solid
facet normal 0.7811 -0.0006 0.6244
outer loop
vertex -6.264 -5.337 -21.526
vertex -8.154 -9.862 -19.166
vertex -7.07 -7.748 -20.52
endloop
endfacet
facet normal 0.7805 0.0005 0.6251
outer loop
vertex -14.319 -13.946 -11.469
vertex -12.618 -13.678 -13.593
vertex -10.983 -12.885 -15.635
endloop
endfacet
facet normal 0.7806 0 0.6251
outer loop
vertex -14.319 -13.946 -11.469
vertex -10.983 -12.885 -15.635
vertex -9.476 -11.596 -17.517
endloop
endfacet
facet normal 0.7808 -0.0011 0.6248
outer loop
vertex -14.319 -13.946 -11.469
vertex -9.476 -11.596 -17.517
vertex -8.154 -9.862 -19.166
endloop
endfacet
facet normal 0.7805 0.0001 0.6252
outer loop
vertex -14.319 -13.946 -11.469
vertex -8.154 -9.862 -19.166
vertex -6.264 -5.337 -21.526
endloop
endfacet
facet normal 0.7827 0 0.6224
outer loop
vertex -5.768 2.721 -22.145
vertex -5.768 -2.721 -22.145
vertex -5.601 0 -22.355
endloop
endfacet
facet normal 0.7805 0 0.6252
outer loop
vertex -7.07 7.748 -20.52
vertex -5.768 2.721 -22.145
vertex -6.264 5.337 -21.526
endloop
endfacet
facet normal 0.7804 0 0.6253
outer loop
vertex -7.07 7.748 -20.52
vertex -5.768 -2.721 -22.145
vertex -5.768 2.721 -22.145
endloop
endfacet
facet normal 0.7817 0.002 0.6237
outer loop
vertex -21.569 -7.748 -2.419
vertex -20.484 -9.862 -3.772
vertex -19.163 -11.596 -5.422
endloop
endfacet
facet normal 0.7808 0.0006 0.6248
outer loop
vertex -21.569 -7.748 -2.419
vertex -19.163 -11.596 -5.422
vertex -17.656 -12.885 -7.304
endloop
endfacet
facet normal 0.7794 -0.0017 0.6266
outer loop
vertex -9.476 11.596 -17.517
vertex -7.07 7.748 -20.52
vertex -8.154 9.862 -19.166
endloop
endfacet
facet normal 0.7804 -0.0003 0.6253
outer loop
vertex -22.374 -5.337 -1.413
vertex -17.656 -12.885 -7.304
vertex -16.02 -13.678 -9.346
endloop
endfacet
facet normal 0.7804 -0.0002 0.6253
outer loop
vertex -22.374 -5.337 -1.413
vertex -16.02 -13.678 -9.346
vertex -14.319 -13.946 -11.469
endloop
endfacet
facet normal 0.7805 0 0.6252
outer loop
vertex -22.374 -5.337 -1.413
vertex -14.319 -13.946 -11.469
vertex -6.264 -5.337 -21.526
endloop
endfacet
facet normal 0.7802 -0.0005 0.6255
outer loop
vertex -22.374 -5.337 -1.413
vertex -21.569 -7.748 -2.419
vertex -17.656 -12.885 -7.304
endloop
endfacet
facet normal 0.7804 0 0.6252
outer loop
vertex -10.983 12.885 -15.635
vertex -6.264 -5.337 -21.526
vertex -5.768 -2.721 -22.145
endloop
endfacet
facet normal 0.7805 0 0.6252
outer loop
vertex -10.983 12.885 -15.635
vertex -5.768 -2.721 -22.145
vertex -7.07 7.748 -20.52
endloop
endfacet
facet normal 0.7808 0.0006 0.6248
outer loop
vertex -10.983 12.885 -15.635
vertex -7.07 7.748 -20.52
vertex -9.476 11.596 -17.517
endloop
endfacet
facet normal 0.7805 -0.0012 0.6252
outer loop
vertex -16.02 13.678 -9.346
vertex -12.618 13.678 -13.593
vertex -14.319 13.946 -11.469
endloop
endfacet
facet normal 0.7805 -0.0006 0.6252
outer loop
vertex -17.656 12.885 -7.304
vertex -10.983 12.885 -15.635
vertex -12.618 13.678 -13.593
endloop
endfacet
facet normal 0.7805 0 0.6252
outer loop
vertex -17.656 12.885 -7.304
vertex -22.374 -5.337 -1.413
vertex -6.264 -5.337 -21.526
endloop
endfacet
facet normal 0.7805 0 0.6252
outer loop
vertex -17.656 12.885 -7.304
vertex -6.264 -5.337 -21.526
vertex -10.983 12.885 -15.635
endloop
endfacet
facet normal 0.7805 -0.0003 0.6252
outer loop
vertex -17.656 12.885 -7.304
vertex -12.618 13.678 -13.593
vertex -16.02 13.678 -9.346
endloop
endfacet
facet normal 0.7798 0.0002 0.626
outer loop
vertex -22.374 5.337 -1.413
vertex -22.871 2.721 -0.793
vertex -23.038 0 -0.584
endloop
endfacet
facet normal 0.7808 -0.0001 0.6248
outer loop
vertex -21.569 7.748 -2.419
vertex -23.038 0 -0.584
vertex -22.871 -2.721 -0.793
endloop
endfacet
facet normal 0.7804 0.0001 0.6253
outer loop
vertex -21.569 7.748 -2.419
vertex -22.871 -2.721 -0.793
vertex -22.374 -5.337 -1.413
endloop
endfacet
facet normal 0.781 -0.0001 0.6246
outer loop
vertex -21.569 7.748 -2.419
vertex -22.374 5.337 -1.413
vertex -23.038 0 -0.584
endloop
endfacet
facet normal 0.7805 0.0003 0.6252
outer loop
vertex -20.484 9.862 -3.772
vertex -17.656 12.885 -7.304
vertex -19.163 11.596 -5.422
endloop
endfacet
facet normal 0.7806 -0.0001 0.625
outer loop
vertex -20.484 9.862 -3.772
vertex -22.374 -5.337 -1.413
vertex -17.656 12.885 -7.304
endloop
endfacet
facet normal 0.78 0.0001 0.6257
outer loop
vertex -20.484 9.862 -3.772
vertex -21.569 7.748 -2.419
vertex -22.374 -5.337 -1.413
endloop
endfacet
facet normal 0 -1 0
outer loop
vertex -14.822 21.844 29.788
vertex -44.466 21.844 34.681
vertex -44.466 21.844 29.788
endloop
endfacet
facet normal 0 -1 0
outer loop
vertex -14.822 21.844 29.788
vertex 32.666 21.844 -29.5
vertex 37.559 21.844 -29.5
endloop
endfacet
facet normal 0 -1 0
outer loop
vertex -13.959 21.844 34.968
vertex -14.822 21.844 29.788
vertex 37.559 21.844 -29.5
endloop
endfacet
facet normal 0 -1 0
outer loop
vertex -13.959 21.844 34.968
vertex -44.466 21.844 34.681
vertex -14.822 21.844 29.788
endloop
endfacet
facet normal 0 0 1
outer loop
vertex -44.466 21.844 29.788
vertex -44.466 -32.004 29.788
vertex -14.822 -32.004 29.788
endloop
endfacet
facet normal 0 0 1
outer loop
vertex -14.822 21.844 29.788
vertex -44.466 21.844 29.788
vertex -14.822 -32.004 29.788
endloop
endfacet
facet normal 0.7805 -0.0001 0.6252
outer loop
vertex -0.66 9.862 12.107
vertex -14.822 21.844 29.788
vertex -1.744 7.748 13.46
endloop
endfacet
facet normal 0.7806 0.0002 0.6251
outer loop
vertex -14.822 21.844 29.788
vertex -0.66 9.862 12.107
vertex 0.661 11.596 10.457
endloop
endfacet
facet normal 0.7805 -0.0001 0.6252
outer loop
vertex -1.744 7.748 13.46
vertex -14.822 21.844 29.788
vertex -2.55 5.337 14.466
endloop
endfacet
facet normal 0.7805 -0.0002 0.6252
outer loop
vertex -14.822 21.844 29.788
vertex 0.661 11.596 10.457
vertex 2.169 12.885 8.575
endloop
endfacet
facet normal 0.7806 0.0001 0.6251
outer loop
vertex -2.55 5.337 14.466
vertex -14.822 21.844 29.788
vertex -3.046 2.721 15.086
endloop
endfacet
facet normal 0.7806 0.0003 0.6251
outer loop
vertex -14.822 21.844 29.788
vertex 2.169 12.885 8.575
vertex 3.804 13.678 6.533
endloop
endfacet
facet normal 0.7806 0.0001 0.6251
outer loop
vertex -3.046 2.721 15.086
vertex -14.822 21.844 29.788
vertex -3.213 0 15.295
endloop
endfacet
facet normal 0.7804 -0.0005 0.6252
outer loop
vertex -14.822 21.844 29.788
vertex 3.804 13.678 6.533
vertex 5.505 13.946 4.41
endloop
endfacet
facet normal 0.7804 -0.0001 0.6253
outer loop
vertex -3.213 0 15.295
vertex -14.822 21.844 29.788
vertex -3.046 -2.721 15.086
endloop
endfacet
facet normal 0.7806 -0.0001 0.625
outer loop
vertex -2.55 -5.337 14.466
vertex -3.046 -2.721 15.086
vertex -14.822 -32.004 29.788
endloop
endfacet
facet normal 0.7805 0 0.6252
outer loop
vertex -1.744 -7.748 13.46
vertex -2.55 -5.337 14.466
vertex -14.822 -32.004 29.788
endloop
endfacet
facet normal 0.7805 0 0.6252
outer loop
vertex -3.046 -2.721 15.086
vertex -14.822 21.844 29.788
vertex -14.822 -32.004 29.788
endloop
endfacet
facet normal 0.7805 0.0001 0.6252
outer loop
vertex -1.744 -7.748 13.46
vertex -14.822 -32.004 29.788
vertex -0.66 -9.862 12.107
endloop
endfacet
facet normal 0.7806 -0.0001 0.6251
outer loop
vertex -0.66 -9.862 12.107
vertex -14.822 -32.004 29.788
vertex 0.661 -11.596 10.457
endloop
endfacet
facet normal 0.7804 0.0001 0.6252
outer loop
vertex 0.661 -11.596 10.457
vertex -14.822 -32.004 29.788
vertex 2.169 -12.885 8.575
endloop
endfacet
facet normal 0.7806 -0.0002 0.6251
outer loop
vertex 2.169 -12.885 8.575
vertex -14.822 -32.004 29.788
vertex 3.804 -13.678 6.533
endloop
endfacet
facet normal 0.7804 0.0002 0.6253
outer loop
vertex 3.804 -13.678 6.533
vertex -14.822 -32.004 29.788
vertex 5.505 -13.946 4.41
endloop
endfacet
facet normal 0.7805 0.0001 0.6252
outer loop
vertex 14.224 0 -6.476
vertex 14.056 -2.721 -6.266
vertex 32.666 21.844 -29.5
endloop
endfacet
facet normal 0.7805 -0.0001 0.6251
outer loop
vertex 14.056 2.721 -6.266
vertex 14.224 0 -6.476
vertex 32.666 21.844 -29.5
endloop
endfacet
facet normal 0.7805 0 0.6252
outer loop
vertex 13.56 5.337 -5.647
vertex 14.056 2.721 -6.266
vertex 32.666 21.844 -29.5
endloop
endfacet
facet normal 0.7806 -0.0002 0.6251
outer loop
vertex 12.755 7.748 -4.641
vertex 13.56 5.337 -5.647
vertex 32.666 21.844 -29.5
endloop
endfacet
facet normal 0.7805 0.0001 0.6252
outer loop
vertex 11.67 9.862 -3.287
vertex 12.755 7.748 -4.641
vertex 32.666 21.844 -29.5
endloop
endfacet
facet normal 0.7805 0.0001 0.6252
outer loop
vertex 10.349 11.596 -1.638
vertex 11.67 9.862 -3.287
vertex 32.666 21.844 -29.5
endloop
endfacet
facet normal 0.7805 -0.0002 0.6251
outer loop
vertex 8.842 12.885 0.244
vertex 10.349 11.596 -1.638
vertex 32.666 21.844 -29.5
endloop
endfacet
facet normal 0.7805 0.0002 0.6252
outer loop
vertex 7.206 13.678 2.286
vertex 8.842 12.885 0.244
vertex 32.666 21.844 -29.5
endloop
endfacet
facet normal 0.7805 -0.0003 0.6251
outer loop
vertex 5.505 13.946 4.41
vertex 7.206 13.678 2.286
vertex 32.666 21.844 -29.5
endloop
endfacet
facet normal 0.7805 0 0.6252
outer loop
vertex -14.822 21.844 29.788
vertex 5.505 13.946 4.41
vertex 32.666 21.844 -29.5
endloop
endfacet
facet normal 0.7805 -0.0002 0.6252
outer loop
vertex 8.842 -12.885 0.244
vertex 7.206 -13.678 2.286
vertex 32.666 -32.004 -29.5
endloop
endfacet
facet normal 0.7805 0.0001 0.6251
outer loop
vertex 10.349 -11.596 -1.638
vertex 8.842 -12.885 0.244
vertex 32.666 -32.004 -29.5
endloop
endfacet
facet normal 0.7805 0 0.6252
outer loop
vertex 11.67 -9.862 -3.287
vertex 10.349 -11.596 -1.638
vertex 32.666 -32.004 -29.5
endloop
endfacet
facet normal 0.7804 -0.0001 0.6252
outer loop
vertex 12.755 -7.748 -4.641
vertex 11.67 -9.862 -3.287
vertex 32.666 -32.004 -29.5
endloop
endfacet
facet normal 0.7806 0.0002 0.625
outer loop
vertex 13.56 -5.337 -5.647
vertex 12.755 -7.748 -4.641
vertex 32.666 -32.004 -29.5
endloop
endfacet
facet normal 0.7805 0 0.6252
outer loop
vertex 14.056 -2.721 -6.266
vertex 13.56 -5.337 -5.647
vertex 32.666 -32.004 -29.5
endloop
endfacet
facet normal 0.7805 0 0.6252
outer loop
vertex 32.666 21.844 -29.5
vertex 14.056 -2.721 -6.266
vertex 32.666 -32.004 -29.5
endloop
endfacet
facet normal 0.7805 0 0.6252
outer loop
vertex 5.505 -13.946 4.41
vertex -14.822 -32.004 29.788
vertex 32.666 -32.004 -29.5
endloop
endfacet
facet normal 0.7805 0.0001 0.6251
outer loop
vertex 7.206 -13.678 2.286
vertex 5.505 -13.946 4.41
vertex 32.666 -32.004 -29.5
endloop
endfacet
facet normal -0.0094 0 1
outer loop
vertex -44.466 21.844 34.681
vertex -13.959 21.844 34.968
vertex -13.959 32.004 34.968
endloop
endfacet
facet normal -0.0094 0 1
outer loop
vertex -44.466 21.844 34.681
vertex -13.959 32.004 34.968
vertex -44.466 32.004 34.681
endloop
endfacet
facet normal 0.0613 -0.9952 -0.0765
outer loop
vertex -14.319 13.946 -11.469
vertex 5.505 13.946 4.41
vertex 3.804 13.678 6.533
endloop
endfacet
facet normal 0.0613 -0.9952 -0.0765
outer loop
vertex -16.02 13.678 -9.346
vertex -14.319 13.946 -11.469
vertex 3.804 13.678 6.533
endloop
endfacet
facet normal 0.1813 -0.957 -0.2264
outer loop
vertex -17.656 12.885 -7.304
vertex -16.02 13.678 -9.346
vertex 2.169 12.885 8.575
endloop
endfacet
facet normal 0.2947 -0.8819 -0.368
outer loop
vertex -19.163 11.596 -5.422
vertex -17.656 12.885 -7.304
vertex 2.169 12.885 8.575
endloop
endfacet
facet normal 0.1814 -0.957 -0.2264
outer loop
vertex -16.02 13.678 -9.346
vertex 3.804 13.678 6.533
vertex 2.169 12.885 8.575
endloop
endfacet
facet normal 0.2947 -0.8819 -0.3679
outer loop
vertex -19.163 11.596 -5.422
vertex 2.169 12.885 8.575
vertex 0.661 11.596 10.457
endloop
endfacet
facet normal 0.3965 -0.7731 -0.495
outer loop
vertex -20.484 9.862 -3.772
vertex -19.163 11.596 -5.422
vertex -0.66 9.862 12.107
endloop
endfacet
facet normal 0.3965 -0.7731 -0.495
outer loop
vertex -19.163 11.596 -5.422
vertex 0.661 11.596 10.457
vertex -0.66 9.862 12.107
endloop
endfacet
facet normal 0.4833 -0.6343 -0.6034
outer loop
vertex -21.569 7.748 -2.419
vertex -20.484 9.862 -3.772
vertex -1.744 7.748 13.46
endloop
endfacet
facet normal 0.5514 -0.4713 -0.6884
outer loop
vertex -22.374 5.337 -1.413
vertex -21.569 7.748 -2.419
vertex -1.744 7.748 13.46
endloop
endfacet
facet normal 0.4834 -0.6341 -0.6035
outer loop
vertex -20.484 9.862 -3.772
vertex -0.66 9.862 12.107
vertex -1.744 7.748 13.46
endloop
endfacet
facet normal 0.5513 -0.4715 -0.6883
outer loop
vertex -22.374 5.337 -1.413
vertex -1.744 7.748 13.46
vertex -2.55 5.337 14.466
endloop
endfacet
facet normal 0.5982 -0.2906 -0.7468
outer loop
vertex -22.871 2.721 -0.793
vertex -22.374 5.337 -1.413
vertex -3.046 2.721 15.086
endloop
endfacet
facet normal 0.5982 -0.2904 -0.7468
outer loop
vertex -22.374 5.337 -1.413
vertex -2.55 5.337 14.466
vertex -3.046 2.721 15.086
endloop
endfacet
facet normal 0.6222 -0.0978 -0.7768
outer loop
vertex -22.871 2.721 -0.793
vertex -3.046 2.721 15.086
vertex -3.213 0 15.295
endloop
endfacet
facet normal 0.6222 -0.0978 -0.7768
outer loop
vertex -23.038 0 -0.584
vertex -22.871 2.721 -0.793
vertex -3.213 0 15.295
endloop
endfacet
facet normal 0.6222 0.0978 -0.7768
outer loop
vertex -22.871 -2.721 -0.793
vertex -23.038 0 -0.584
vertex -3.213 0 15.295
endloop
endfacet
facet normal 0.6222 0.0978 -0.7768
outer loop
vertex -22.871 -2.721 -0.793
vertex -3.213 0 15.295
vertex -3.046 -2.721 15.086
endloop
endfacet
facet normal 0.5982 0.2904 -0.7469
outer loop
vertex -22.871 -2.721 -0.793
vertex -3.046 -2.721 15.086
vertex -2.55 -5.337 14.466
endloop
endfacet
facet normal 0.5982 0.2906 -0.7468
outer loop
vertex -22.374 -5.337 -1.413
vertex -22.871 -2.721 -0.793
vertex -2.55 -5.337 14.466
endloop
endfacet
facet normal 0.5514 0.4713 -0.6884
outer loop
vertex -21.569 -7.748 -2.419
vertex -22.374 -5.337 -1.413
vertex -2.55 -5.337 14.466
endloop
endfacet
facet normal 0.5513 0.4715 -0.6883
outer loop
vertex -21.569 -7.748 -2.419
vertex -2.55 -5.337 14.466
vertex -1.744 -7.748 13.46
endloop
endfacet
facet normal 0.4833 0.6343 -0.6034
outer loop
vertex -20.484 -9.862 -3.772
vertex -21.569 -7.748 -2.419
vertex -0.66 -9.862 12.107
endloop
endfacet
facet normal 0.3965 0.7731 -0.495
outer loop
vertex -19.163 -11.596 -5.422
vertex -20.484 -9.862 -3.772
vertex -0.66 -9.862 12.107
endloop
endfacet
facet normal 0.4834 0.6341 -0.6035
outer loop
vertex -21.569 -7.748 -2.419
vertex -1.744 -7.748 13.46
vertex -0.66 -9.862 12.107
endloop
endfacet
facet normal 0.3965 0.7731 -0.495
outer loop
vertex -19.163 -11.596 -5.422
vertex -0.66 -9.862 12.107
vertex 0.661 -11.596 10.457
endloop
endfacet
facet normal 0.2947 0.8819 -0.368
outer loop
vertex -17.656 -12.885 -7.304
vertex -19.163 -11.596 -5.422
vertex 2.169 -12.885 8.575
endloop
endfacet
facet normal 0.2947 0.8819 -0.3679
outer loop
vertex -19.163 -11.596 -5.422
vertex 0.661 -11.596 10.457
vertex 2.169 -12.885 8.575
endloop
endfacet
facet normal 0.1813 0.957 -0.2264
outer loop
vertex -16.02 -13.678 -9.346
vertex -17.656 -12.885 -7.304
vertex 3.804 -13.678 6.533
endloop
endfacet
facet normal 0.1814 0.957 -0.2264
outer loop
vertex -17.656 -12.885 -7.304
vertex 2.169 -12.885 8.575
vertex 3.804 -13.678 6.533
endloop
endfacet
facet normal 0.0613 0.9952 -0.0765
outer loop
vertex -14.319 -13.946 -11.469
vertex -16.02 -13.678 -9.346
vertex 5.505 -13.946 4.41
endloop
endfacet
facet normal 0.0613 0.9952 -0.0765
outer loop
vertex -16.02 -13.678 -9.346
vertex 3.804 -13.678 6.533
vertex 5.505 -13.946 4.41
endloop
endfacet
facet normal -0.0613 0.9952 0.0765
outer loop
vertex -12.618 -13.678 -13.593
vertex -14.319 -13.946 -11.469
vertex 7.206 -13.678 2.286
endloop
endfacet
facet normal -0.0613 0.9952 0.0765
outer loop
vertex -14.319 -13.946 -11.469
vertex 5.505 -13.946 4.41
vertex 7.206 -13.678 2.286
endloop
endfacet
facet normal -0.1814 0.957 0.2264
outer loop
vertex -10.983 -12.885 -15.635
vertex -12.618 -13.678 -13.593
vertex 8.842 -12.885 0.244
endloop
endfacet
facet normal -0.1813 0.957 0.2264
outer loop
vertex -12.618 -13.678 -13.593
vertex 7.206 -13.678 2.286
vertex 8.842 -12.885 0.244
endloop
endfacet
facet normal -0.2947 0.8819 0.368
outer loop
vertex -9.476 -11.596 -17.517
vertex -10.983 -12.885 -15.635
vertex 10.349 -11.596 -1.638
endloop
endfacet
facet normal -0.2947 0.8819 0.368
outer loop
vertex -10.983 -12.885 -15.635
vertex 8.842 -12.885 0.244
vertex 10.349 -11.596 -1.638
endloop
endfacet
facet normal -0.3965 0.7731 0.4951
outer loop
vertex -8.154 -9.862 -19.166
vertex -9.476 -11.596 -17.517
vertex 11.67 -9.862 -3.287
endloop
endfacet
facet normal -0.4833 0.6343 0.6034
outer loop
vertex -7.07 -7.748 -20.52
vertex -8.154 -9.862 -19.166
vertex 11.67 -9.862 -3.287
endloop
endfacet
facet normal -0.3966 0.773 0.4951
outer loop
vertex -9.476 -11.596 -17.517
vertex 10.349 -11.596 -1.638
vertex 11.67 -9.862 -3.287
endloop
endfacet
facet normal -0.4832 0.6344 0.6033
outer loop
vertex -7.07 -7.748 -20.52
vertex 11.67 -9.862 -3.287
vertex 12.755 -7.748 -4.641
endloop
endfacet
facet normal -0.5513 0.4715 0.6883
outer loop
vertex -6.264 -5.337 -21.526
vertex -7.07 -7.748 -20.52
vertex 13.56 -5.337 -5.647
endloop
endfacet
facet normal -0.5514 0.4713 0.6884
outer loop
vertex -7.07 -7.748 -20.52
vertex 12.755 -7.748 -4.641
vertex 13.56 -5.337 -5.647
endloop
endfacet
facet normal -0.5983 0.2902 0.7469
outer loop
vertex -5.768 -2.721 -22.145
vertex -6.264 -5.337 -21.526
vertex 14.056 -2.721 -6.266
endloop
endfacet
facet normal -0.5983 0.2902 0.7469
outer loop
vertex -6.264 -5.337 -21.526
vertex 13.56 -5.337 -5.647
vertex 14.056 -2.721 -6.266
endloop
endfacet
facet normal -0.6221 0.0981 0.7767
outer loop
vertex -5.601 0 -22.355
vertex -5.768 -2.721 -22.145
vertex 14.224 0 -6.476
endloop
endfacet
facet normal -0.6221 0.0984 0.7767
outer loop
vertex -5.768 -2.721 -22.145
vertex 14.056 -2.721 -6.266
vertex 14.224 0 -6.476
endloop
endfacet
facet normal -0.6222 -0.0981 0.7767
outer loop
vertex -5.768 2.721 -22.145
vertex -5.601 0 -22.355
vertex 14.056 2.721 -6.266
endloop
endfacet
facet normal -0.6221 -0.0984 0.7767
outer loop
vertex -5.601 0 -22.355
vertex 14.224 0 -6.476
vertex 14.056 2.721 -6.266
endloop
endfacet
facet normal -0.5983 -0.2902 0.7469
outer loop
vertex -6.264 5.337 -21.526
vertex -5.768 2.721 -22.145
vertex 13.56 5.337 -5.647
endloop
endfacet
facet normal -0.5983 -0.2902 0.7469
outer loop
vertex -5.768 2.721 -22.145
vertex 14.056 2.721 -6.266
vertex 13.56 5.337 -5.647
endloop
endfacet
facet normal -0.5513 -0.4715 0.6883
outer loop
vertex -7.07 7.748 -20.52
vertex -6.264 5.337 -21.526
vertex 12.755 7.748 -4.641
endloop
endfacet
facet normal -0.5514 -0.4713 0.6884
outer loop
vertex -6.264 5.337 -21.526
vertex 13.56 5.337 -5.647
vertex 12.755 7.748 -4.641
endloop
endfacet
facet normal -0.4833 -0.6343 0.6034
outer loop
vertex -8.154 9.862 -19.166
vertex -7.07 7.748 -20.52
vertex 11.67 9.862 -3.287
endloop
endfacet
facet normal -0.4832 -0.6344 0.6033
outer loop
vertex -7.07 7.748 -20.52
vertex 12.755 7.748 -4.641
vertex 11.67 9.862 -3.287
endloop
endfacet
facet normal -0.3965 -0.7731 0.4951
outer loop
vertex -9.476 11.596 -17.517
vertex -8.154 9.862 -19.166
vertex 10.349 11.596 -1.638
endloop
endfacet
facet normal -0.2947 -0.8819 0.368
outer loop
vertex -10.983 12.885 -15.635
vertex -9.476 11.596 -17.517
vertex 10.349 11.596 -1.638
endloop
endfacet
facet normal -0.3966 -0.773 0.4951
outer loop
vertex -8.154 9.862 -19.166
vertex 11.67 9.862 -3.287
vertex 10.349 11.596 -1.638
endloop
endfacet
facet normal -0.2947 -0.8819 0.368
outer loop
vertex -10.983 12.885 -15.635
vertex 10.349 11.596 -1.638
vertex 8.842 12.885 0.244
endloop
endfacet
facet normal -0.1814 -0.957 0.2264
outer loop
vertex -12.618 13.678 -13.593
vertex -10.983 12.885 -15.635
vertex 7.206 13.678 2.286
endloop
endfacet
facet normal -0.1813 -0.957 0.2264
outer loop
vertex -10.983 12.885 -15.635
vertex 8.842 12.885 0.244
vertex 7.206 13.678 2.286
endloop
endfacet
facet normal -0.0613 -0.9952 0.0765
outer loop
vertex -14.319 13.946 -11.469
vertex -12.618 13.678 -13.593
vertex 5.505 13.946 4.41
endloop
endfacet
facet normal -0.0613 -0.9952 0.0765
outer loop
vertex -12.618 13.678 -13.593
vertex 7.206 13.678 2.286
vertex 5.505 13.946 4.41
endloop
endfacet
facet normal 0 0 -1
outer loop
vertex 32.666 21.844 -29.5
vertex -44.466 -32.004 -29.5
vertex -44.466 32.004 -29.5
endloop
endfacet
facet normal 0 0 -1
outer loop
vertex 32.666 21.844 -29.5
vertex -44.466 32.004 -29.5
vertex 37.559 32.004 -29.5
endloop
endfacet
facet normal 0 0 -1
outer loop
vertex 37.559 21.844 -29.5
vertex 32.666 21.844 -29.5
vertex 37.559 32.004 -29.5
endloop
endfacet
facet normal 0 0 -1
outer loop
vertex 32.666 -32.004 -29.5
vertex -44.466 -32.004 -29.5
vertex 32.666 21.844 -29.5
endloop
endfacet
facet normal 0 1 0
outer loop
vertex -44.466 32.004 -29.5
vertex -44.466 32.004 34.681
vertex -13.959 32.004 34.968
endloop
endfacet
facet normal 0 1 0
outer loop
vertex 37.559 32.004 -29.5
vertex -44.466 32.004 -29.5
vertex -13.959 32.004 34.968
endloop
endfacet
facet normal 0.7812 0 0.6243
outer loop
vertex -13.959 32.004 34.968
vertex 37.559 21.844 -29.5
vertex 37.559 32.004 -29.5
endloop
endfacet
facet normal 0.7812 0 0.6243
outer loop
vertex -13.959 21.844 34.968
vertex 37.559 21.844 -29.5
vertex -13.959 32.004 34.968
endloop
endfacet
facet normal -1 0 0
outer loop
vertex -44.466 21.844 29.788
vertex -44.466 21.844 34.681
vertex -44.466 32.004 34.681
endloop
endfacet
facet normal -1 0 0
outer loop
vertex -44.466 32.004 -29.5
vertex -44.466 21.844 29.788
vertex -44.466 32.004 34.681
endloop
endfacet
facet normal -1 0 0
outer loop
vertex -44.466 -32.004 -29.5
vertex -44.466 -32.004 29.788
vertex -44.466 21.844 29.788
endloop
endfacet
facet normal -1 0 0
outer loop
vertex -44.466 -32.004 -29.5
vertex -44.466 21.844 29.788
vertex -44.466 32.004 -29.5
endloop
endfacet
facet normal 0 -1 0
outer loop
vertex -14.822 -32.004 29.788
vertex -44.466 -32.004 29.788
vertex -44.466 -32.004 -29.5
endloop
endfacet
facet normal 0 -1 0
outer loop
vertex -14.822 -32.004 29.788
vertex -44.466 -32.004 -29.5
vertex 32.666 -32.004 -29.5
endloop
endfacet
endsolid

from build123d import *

# Parameters (mm, degrees)
F1_DEPTH = 32.004
F2_DEPTH = 32.004
F4_DEPTH = 53.848
F5_R     = 13.9464432641
F6_DEPTH = 25.4


with BuildPart() as f1:
    # F0 (on Front) → F1 (new body)
    with BuildSketch(Plane.XZ):
        Polygon((-13.9585789293, 34.9684022367), (-44.4659888744, 34.6805937588), (-44.4659888744, -29.5000895858), (37.5586524606, -29.5000895858), align=None)
    extrude(amount=F1_DEPTH)

    # F2 (add): a face of the model
    f2_faces = [f1.faces().sort_by_distance(p)[0] for p in [
        (-14.3434422771, 0, -2.2296991065),
    ]]
    extrude(f2_faces, amount=F2_DEPTH)

    # F3 (on face) → F4 (cut)
    with BuildSketch(Plane.XZ.offset(32.004)):
        Polygon((-44.4659888744, 34.6805937588), (-44.4659888744, 29.7878943384), (-14.8219969124, 29.7878943384), (32.6659567654, -29.5000895858), (37.5586524606, -29.5000895858), (-13.9585789293, 34.9684022367), align=None)
    extrude(amount=-F4_DEPTH, mode=Mode.SUBTRACT)

    # F5 (on face) → F6 (cut)
    with BuildSketch(Plane(origin=(5.5052949063, 0, 4.409581372), x_dir=(0, 1, 0), z_dir=(0.7804989961, 0, 0.6251570339))):
        Circle(F5_R)
    extrude(amount=-F6_DEPTH, mode=Mode.SUBTRACT)


solid = f1.part
